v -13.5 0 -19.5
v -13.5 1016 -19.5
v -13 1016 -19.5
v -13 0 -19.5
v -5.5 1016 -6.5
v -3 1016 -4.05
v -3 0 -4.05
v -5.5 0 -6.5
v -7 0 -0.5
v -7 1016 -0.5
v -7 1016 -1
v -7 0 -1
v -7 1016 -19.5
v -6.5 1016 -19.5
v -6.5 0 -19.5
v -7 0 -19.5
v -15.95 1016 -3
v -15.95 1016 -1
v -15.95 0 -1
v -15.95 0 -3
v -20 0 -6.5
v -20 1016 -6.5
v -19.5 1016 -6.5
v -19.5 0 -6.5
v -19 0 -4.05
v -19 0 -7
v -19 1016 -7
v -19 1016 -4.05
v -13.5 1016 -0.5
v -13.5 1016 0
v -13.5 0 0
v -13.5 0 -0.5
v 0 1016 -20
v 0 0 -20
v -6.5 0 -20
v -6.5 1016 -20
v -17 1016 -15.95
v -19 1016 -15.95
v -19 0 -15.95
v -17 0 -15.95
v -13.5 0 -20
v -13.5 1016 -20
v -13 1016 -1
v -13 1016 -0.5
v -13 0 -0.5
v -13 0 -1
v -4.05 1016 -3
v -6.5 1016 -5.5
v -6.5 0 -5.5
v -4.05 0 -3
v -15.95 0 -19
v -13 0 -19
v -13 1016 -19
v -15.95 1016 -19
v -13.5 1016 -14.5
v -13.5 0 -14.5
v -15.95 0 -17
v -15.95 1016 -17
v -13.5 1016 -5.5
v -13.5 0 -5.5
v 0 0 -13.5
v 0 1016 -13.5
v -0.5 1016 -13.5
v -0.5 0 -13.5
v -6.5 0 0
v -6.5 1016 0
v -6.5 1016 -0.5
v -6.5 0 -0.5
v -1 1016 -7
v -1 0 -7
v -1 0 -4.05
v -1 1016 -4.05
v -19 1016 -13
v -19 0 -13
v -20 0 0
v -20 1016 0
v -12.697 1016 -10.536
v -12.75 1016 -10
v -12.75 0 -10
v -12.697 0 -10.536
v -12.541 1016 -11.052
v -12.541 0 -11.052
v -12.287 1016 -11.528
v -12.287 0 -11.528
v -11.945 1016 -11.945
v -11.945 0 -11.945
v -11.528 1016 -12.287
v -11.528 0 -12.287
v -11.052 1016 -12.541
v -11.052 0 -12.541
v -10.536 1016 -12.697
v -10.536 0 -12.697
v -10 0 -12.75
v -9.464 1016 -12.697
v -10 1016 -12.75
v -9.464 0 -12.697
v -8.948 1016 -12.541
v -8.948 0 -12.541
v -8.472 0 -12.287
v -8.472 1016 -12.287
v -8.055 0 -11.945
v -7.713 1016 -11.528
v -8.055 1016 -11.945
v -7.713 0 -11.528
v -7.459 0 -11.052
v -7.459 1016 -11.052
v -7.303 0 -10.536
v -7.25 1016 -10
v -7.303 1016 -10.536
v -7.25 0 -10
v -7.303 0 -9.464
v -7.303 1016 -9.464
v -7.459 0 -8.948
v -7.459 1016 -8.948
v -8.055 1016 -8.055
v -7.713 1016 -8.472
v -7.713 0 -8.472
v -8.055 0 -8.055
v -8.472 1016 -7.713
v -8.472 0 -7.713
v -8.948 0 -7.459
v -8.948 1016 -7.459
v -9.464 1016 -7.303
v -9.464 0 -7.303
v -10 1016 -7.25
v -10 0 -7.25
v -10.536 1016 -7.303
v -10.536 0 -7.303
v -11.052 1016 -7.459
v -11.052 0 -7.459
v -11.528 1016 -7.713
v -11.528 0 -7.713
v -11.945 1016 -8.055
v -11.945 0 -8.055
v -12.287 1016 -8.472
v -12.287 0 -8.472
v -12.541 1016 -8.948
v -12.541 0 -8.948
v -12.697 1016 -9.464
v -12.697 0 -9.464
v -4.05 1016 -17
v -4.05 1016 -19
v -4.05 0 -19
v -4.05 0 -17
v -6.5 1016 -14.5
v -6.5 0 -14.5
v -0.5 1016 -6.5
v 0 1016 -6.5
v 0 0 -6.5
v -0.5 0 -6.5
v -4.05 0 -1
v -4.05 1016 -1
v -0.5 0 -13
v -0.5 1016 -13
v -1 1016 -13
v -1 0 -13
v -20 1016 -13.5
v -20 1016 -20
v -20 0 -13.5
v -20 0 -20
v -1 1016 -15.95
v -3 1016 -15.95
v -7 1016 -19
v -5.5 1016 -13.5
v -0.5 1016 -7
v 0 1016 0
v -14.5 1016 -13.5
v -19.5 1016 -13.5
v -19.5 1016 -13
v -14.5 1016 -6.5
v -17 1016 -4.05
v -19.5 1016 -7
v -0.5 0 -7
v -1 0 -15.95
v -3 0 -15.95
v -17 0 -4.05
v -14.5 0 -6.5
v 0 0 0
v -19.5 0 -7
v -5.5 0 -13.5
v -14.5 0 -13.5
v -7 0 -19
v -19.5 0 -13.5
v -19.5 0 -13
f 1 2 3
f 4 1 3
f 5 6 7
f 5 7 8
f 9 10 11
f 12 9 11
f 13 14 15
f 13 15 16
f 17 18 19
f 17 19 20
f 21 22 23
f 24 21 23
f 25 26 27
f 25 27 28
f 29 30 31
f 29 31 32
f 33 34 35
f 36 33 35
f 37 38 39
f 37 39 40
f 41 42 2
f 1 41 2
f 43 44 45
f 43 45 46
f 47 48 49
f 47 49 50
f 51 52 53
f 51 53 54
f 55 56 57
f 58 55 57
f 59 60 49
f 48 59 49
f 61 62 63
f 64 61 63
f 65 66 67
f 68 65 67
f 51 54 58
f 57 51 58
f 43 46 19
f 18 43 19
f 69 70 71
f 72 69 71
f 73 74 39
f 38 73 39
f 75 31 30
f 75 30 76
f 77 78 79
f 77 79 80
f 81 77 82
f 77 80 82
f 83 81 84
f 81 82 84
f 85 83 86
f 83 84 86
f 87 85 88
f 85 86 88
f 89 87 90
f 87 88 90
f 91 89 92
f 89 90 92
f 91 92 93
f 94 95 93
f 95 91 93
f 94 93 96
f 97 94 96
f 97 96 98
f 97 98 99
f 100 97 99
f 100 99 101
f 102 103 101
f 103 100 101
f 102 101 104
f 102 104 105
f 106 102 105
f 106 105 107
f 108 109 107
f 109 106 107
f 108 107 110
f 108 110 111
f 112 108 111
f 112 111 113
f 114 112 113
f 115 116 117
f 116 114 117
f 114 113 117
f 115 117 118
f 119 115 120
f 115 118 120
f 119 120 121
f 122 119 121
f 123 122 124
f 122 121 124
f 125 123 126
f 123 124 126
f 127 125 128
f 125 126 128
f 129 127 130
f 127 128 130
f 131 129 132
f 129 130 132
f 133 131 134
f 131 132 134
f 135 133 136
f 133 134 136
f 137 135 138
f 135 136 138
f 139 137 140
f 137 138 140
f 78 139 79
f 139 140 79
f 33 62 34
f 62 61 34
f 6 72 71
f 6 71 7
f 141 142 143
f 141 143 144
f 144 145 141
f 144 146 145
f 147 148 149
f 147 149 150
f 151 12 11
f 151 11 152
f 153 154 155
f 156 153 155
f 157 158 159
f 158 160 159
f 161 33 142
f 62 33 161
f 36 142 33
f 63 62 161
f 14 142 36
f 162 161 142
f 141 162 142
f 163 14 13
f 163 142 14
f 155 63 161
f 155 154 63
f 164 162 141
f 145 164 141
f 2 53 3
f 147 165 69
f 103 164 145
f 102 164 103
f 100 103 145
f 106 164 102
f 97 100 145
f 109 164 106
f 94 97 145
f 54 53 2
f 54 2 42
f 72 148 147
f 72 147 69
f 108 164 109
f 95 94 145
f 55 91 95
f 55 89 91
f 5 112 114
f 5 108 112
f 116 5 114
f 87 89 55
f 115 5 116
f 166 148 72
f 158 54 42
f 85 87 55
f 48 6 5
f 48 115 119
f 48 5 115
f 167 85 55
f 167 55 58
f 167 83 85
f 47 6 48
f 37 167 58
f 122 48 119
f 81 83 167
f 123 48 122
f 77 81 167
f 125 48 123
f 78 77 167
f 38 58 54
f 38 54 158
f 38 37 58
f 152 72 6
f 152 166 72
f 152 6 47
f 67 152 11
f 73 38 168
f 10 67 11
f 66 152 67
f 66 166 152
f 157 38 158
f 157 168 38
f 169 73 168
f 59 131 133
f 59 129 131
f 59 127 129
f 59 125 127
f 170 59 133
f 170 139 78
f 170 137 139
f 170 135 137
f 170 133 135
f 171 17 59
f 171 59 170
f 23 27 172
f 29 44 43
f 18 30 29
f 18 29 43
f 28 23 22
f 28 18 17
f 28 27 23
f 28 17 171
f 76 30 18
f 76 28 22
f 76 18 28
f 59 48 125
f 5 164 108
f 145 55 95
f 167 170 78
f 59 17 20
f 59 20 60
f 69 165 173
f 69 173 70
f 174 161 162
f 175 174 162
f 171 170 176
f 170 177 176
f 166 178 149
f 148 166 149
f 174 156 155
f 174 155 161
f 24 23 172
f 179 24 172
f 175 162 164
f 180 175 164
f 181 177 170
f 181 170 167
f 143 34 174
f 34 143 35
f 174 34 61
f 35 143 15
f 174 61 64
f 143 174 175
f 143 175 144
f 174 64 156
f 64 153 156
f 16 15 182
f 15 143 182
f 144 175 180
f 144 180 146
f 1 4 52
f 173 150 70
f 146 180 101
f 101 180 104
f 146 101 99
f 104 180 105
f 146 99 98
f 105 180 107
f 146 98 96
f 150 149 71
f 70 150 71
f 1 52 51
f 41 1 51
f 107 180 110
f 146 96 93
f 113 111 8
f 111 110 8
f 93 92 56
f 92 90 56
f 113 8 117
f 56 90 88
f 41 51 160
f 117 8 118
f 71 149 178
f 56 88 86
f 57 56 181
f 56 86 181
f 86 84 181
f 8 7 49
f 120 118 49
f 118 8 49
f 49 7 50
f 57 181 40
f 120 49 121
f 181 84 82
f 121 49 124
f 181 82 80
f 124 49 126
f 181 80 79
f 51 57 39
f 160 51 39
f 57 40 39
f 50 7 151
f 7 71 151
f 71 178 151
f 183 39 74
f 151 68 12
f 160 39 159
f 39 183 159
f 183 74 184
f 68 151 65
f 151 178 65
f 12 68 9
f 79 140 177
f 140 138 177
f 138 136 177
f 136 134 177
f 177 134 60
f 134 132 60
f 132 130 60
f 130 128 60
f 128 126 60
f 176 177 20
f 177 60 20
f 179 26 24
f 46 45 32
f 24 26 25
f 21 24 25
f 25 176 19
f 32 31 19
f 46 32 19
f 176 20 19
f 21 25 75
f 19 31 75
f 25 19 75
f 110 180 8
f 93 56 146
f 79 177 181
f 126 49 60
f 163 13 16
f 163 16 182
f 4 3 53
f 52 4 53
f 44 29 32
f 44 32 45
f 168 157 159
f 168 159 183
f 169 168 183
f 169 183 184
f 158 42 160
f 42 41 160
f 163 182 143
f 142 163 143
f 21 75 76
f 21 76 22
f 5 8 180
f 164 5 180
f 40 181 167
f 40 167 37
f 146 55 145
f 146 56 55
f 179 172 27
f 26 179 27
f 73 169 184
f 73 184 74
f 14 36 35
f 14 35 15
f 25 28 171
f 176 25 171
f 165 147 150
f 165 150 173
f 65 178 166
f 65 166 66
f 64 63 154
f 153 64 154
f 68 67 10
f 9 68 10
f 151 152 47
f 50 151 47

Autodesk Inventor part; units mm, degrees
ref_plane "YZ Plane" through (0, 0, 0) normal (1, 0, 0) x (0, 1, 0)
ref_plane "XZ Plane" through (0, 0, 0) normal (0, 1, 0) x (-1, 0, 0)
ref_plane "XY Plane" through (0, 0, 0) normal (0, 0, 1) x (1, 0, 0)
sketch "Sketch1" plane through (0, 0, 0) normal (0, 1, 0) x (-1, 0, 0)
  line L0 (0, 0) -> (0, -6.5)
  line L1 (0, -6.5) -> (0.5, -6.5)
  line L2 (0.5, -6.5) -> (0.5, -7)
  line L3 (0.5, -7) -> (1, -7)
  line L4 (1, -7) -> (1, -4.05)
  line L5 (1, -4.05) -> (3, -4.05)
  line L6 (5.5, -6.5) -> (5.5, -13.5)
  line L7 (0, -13.5) -> (0.5, -13.5)
  line L8 (0.5, -13.5) -> (0.5, -13)
  line L9 (0.5, -13) -> (1, -13)
  line L10 (1, -13) -> (1, -15.95)
  line L11 (1, -15.95) -> (3, -15.95)
  line L12 (3, -15.95) -> (5.5, -13.5)
  line L13 (3, -4.05) -> (5.5, -6.5)
  line L14 (0, -13.5) -> (0, -20)
  line L15 (0, -20) -> (6.5, -20)
  line L16 (6.5, -20) -> (6.5, -19.5)
  line L17 (6.5, -19.5) -> (7, -19.5)
  line L18 (7, -19.5) -> (7, -19)
  line L19 (7, -19) -> (4.05, -19)
  line L20 (4.05, -19) -> (4.05, -17)
  line L21 (0, 0) -> (6.5, 0)
  line L22 (6.5, 0) -> (6.5, -0.5)
  line L23 (6.5, -0.5) -> (7, -0.5)
  line L24 (7, -0.5) -> (7, -1)
  line L25 (7, -1) -> (4.05, -1)
  line L26 (4.05, -1) -> (4.05, -3)
  line L27 (13.5, -20) -> (13.5, -19.5)
  line L28 (13.5, -19.5) -> (13, -19.5)
  line L29 (13, -19.5) -> (13, -19)
  line L30 (13, -19) -> (15.95, -19)
  line L31 (15.95, -19) -> (15.95, -17)
  line L32 (13.5, -14.5) -> (6.5, -14.5)
  line L33 (6.5, -14.5) -> (4.05, -17)
  line L34 (13.5, -14.5) -> (15.95, -17)
  line L35 (13.5, -20) -> (20, -20)
  line L36 (20, -20) -> (20, -13.5)
  line L37 (20, -13.5) -> (19.5, -13.5)
  line L38 (19.5, -13.5) -> (19.5, -13)
  line L39 (19.5, -13) -> (19, -13)
  line L40 (19, -13) -> (19, -15.95)
  line L41 (19, -15.95) -> (17, -15.95)
  line L42 (13.5, 0) -> (13.5, -0.5)
  line L43 (13.5, -0.5) -> (13, -0.5)
  line L44 (13, -0.5) -> (13, -1)
  line L45 (13, -1) -> (15.95, -1)
  line L46 (15.95, -1) -> (15.95, -3)
  line L47 (13.5, 0) -> (20, 0)
  line L48 (20, 0) -> (20, -6.5)
  line L49 (20, -6.5) -> (19.5, -6.5)
  line L50 (19.5, -6.5) -> (19.5, -7)
  line L51 (19.5, -7) -> (19, -7)
  line L52 (19, -7) -> (19, -4.05)
  line L53 (19, -4.05) -> (17, -4.05)
  line L54 (13.5, -5.5) -> (6.5, -5.5)
  line L55 (15.95, -3) -> (13.5, -5.5)
  line L56 (6.5, -5.5) -> (4.05, -3)
  line L57 (14.5, -6.5) -> (14.5, -13.5)
  line L58 (14.5, -13.5) -> (17, -15.95)
  line L59 (14.5, -6.5) -> (17, -4.05)
  circle A0 centre (10, -10) radius 2.75
  dimension "d0" = 6.5
  dimension "d1" = 0.5
  dimension "d2" = 0.5
  dimension "d3" = 0.5
  dimension "d4" = 2.95
  dimension "d5" = 2
  dimension "d6" = 7
  dimension "d7" = 0.5
  dimension "d8" = 2.95
  dimension "d9" = 2
  dimension "d10" = 6.5
  dimension "d11" = 6.5
  dimension "d12" = 0.5
  dimension "d13" = 0.5
  dimension "d14" = 0.5
  dimension "d15" = 2.95
  dimension "d16" = 2
  dimension "d17" = 5.5
  dimension "d18" = 6.5
  dimension "d19" = 0.5
  dimension "d20" = 0.5
  dimension "d21" = 0.5
  dimension "d22" = 2.95
  dimension "d23" = 2
  dimension "d24" = 5.5
  dimension "d25" = 0.5
  dimension "d26" = 0.5
  dimension "d27" = 0.5
  dimension "d28" = 0.5
  dimension "d29" = 2.95
  dimension "d30" = 2
  dimension "d31" = 7
  dimension "d32" = 6.5
  dimension "d33" = 6.5
  dimension "d34" = 0.5
  dimension "d35" = 0.5
  dimension "d36" = 0.5
  dimension "d37" = 2.95
  dimension "d38" = 2
  dimension "d39" = 5.5
  dimension "d40" = 5.5
  dimension "d41" = 0.5
  dimension "d42" = 0.5
  dimension "d43" = 0.5
  dimension "d44" = 2.95
  dimension "d45" = 2
  dimension "d46" = 6.5
  dimension "d47" = 6.5
  dimension "d48" = 0.5
  dimension "d49" = 0.5
  dimension "d50" = 0.5
  dimension "d51" = 2.95
  dimension "d52" = 2
  dimension "d53" = 7
  dimension "d54" = 5.5
  dimension "d55" = 5.5
  dimension "d56" = 5.5
  dimension "d57" = 5.5
  dimension "d58" = 10
  dimension "d59" = 10
extrude "Extrusion1" add sketch "Sketch1" along normal blind 1016
properties part number "Tslot_2020extrusion_40inch"
